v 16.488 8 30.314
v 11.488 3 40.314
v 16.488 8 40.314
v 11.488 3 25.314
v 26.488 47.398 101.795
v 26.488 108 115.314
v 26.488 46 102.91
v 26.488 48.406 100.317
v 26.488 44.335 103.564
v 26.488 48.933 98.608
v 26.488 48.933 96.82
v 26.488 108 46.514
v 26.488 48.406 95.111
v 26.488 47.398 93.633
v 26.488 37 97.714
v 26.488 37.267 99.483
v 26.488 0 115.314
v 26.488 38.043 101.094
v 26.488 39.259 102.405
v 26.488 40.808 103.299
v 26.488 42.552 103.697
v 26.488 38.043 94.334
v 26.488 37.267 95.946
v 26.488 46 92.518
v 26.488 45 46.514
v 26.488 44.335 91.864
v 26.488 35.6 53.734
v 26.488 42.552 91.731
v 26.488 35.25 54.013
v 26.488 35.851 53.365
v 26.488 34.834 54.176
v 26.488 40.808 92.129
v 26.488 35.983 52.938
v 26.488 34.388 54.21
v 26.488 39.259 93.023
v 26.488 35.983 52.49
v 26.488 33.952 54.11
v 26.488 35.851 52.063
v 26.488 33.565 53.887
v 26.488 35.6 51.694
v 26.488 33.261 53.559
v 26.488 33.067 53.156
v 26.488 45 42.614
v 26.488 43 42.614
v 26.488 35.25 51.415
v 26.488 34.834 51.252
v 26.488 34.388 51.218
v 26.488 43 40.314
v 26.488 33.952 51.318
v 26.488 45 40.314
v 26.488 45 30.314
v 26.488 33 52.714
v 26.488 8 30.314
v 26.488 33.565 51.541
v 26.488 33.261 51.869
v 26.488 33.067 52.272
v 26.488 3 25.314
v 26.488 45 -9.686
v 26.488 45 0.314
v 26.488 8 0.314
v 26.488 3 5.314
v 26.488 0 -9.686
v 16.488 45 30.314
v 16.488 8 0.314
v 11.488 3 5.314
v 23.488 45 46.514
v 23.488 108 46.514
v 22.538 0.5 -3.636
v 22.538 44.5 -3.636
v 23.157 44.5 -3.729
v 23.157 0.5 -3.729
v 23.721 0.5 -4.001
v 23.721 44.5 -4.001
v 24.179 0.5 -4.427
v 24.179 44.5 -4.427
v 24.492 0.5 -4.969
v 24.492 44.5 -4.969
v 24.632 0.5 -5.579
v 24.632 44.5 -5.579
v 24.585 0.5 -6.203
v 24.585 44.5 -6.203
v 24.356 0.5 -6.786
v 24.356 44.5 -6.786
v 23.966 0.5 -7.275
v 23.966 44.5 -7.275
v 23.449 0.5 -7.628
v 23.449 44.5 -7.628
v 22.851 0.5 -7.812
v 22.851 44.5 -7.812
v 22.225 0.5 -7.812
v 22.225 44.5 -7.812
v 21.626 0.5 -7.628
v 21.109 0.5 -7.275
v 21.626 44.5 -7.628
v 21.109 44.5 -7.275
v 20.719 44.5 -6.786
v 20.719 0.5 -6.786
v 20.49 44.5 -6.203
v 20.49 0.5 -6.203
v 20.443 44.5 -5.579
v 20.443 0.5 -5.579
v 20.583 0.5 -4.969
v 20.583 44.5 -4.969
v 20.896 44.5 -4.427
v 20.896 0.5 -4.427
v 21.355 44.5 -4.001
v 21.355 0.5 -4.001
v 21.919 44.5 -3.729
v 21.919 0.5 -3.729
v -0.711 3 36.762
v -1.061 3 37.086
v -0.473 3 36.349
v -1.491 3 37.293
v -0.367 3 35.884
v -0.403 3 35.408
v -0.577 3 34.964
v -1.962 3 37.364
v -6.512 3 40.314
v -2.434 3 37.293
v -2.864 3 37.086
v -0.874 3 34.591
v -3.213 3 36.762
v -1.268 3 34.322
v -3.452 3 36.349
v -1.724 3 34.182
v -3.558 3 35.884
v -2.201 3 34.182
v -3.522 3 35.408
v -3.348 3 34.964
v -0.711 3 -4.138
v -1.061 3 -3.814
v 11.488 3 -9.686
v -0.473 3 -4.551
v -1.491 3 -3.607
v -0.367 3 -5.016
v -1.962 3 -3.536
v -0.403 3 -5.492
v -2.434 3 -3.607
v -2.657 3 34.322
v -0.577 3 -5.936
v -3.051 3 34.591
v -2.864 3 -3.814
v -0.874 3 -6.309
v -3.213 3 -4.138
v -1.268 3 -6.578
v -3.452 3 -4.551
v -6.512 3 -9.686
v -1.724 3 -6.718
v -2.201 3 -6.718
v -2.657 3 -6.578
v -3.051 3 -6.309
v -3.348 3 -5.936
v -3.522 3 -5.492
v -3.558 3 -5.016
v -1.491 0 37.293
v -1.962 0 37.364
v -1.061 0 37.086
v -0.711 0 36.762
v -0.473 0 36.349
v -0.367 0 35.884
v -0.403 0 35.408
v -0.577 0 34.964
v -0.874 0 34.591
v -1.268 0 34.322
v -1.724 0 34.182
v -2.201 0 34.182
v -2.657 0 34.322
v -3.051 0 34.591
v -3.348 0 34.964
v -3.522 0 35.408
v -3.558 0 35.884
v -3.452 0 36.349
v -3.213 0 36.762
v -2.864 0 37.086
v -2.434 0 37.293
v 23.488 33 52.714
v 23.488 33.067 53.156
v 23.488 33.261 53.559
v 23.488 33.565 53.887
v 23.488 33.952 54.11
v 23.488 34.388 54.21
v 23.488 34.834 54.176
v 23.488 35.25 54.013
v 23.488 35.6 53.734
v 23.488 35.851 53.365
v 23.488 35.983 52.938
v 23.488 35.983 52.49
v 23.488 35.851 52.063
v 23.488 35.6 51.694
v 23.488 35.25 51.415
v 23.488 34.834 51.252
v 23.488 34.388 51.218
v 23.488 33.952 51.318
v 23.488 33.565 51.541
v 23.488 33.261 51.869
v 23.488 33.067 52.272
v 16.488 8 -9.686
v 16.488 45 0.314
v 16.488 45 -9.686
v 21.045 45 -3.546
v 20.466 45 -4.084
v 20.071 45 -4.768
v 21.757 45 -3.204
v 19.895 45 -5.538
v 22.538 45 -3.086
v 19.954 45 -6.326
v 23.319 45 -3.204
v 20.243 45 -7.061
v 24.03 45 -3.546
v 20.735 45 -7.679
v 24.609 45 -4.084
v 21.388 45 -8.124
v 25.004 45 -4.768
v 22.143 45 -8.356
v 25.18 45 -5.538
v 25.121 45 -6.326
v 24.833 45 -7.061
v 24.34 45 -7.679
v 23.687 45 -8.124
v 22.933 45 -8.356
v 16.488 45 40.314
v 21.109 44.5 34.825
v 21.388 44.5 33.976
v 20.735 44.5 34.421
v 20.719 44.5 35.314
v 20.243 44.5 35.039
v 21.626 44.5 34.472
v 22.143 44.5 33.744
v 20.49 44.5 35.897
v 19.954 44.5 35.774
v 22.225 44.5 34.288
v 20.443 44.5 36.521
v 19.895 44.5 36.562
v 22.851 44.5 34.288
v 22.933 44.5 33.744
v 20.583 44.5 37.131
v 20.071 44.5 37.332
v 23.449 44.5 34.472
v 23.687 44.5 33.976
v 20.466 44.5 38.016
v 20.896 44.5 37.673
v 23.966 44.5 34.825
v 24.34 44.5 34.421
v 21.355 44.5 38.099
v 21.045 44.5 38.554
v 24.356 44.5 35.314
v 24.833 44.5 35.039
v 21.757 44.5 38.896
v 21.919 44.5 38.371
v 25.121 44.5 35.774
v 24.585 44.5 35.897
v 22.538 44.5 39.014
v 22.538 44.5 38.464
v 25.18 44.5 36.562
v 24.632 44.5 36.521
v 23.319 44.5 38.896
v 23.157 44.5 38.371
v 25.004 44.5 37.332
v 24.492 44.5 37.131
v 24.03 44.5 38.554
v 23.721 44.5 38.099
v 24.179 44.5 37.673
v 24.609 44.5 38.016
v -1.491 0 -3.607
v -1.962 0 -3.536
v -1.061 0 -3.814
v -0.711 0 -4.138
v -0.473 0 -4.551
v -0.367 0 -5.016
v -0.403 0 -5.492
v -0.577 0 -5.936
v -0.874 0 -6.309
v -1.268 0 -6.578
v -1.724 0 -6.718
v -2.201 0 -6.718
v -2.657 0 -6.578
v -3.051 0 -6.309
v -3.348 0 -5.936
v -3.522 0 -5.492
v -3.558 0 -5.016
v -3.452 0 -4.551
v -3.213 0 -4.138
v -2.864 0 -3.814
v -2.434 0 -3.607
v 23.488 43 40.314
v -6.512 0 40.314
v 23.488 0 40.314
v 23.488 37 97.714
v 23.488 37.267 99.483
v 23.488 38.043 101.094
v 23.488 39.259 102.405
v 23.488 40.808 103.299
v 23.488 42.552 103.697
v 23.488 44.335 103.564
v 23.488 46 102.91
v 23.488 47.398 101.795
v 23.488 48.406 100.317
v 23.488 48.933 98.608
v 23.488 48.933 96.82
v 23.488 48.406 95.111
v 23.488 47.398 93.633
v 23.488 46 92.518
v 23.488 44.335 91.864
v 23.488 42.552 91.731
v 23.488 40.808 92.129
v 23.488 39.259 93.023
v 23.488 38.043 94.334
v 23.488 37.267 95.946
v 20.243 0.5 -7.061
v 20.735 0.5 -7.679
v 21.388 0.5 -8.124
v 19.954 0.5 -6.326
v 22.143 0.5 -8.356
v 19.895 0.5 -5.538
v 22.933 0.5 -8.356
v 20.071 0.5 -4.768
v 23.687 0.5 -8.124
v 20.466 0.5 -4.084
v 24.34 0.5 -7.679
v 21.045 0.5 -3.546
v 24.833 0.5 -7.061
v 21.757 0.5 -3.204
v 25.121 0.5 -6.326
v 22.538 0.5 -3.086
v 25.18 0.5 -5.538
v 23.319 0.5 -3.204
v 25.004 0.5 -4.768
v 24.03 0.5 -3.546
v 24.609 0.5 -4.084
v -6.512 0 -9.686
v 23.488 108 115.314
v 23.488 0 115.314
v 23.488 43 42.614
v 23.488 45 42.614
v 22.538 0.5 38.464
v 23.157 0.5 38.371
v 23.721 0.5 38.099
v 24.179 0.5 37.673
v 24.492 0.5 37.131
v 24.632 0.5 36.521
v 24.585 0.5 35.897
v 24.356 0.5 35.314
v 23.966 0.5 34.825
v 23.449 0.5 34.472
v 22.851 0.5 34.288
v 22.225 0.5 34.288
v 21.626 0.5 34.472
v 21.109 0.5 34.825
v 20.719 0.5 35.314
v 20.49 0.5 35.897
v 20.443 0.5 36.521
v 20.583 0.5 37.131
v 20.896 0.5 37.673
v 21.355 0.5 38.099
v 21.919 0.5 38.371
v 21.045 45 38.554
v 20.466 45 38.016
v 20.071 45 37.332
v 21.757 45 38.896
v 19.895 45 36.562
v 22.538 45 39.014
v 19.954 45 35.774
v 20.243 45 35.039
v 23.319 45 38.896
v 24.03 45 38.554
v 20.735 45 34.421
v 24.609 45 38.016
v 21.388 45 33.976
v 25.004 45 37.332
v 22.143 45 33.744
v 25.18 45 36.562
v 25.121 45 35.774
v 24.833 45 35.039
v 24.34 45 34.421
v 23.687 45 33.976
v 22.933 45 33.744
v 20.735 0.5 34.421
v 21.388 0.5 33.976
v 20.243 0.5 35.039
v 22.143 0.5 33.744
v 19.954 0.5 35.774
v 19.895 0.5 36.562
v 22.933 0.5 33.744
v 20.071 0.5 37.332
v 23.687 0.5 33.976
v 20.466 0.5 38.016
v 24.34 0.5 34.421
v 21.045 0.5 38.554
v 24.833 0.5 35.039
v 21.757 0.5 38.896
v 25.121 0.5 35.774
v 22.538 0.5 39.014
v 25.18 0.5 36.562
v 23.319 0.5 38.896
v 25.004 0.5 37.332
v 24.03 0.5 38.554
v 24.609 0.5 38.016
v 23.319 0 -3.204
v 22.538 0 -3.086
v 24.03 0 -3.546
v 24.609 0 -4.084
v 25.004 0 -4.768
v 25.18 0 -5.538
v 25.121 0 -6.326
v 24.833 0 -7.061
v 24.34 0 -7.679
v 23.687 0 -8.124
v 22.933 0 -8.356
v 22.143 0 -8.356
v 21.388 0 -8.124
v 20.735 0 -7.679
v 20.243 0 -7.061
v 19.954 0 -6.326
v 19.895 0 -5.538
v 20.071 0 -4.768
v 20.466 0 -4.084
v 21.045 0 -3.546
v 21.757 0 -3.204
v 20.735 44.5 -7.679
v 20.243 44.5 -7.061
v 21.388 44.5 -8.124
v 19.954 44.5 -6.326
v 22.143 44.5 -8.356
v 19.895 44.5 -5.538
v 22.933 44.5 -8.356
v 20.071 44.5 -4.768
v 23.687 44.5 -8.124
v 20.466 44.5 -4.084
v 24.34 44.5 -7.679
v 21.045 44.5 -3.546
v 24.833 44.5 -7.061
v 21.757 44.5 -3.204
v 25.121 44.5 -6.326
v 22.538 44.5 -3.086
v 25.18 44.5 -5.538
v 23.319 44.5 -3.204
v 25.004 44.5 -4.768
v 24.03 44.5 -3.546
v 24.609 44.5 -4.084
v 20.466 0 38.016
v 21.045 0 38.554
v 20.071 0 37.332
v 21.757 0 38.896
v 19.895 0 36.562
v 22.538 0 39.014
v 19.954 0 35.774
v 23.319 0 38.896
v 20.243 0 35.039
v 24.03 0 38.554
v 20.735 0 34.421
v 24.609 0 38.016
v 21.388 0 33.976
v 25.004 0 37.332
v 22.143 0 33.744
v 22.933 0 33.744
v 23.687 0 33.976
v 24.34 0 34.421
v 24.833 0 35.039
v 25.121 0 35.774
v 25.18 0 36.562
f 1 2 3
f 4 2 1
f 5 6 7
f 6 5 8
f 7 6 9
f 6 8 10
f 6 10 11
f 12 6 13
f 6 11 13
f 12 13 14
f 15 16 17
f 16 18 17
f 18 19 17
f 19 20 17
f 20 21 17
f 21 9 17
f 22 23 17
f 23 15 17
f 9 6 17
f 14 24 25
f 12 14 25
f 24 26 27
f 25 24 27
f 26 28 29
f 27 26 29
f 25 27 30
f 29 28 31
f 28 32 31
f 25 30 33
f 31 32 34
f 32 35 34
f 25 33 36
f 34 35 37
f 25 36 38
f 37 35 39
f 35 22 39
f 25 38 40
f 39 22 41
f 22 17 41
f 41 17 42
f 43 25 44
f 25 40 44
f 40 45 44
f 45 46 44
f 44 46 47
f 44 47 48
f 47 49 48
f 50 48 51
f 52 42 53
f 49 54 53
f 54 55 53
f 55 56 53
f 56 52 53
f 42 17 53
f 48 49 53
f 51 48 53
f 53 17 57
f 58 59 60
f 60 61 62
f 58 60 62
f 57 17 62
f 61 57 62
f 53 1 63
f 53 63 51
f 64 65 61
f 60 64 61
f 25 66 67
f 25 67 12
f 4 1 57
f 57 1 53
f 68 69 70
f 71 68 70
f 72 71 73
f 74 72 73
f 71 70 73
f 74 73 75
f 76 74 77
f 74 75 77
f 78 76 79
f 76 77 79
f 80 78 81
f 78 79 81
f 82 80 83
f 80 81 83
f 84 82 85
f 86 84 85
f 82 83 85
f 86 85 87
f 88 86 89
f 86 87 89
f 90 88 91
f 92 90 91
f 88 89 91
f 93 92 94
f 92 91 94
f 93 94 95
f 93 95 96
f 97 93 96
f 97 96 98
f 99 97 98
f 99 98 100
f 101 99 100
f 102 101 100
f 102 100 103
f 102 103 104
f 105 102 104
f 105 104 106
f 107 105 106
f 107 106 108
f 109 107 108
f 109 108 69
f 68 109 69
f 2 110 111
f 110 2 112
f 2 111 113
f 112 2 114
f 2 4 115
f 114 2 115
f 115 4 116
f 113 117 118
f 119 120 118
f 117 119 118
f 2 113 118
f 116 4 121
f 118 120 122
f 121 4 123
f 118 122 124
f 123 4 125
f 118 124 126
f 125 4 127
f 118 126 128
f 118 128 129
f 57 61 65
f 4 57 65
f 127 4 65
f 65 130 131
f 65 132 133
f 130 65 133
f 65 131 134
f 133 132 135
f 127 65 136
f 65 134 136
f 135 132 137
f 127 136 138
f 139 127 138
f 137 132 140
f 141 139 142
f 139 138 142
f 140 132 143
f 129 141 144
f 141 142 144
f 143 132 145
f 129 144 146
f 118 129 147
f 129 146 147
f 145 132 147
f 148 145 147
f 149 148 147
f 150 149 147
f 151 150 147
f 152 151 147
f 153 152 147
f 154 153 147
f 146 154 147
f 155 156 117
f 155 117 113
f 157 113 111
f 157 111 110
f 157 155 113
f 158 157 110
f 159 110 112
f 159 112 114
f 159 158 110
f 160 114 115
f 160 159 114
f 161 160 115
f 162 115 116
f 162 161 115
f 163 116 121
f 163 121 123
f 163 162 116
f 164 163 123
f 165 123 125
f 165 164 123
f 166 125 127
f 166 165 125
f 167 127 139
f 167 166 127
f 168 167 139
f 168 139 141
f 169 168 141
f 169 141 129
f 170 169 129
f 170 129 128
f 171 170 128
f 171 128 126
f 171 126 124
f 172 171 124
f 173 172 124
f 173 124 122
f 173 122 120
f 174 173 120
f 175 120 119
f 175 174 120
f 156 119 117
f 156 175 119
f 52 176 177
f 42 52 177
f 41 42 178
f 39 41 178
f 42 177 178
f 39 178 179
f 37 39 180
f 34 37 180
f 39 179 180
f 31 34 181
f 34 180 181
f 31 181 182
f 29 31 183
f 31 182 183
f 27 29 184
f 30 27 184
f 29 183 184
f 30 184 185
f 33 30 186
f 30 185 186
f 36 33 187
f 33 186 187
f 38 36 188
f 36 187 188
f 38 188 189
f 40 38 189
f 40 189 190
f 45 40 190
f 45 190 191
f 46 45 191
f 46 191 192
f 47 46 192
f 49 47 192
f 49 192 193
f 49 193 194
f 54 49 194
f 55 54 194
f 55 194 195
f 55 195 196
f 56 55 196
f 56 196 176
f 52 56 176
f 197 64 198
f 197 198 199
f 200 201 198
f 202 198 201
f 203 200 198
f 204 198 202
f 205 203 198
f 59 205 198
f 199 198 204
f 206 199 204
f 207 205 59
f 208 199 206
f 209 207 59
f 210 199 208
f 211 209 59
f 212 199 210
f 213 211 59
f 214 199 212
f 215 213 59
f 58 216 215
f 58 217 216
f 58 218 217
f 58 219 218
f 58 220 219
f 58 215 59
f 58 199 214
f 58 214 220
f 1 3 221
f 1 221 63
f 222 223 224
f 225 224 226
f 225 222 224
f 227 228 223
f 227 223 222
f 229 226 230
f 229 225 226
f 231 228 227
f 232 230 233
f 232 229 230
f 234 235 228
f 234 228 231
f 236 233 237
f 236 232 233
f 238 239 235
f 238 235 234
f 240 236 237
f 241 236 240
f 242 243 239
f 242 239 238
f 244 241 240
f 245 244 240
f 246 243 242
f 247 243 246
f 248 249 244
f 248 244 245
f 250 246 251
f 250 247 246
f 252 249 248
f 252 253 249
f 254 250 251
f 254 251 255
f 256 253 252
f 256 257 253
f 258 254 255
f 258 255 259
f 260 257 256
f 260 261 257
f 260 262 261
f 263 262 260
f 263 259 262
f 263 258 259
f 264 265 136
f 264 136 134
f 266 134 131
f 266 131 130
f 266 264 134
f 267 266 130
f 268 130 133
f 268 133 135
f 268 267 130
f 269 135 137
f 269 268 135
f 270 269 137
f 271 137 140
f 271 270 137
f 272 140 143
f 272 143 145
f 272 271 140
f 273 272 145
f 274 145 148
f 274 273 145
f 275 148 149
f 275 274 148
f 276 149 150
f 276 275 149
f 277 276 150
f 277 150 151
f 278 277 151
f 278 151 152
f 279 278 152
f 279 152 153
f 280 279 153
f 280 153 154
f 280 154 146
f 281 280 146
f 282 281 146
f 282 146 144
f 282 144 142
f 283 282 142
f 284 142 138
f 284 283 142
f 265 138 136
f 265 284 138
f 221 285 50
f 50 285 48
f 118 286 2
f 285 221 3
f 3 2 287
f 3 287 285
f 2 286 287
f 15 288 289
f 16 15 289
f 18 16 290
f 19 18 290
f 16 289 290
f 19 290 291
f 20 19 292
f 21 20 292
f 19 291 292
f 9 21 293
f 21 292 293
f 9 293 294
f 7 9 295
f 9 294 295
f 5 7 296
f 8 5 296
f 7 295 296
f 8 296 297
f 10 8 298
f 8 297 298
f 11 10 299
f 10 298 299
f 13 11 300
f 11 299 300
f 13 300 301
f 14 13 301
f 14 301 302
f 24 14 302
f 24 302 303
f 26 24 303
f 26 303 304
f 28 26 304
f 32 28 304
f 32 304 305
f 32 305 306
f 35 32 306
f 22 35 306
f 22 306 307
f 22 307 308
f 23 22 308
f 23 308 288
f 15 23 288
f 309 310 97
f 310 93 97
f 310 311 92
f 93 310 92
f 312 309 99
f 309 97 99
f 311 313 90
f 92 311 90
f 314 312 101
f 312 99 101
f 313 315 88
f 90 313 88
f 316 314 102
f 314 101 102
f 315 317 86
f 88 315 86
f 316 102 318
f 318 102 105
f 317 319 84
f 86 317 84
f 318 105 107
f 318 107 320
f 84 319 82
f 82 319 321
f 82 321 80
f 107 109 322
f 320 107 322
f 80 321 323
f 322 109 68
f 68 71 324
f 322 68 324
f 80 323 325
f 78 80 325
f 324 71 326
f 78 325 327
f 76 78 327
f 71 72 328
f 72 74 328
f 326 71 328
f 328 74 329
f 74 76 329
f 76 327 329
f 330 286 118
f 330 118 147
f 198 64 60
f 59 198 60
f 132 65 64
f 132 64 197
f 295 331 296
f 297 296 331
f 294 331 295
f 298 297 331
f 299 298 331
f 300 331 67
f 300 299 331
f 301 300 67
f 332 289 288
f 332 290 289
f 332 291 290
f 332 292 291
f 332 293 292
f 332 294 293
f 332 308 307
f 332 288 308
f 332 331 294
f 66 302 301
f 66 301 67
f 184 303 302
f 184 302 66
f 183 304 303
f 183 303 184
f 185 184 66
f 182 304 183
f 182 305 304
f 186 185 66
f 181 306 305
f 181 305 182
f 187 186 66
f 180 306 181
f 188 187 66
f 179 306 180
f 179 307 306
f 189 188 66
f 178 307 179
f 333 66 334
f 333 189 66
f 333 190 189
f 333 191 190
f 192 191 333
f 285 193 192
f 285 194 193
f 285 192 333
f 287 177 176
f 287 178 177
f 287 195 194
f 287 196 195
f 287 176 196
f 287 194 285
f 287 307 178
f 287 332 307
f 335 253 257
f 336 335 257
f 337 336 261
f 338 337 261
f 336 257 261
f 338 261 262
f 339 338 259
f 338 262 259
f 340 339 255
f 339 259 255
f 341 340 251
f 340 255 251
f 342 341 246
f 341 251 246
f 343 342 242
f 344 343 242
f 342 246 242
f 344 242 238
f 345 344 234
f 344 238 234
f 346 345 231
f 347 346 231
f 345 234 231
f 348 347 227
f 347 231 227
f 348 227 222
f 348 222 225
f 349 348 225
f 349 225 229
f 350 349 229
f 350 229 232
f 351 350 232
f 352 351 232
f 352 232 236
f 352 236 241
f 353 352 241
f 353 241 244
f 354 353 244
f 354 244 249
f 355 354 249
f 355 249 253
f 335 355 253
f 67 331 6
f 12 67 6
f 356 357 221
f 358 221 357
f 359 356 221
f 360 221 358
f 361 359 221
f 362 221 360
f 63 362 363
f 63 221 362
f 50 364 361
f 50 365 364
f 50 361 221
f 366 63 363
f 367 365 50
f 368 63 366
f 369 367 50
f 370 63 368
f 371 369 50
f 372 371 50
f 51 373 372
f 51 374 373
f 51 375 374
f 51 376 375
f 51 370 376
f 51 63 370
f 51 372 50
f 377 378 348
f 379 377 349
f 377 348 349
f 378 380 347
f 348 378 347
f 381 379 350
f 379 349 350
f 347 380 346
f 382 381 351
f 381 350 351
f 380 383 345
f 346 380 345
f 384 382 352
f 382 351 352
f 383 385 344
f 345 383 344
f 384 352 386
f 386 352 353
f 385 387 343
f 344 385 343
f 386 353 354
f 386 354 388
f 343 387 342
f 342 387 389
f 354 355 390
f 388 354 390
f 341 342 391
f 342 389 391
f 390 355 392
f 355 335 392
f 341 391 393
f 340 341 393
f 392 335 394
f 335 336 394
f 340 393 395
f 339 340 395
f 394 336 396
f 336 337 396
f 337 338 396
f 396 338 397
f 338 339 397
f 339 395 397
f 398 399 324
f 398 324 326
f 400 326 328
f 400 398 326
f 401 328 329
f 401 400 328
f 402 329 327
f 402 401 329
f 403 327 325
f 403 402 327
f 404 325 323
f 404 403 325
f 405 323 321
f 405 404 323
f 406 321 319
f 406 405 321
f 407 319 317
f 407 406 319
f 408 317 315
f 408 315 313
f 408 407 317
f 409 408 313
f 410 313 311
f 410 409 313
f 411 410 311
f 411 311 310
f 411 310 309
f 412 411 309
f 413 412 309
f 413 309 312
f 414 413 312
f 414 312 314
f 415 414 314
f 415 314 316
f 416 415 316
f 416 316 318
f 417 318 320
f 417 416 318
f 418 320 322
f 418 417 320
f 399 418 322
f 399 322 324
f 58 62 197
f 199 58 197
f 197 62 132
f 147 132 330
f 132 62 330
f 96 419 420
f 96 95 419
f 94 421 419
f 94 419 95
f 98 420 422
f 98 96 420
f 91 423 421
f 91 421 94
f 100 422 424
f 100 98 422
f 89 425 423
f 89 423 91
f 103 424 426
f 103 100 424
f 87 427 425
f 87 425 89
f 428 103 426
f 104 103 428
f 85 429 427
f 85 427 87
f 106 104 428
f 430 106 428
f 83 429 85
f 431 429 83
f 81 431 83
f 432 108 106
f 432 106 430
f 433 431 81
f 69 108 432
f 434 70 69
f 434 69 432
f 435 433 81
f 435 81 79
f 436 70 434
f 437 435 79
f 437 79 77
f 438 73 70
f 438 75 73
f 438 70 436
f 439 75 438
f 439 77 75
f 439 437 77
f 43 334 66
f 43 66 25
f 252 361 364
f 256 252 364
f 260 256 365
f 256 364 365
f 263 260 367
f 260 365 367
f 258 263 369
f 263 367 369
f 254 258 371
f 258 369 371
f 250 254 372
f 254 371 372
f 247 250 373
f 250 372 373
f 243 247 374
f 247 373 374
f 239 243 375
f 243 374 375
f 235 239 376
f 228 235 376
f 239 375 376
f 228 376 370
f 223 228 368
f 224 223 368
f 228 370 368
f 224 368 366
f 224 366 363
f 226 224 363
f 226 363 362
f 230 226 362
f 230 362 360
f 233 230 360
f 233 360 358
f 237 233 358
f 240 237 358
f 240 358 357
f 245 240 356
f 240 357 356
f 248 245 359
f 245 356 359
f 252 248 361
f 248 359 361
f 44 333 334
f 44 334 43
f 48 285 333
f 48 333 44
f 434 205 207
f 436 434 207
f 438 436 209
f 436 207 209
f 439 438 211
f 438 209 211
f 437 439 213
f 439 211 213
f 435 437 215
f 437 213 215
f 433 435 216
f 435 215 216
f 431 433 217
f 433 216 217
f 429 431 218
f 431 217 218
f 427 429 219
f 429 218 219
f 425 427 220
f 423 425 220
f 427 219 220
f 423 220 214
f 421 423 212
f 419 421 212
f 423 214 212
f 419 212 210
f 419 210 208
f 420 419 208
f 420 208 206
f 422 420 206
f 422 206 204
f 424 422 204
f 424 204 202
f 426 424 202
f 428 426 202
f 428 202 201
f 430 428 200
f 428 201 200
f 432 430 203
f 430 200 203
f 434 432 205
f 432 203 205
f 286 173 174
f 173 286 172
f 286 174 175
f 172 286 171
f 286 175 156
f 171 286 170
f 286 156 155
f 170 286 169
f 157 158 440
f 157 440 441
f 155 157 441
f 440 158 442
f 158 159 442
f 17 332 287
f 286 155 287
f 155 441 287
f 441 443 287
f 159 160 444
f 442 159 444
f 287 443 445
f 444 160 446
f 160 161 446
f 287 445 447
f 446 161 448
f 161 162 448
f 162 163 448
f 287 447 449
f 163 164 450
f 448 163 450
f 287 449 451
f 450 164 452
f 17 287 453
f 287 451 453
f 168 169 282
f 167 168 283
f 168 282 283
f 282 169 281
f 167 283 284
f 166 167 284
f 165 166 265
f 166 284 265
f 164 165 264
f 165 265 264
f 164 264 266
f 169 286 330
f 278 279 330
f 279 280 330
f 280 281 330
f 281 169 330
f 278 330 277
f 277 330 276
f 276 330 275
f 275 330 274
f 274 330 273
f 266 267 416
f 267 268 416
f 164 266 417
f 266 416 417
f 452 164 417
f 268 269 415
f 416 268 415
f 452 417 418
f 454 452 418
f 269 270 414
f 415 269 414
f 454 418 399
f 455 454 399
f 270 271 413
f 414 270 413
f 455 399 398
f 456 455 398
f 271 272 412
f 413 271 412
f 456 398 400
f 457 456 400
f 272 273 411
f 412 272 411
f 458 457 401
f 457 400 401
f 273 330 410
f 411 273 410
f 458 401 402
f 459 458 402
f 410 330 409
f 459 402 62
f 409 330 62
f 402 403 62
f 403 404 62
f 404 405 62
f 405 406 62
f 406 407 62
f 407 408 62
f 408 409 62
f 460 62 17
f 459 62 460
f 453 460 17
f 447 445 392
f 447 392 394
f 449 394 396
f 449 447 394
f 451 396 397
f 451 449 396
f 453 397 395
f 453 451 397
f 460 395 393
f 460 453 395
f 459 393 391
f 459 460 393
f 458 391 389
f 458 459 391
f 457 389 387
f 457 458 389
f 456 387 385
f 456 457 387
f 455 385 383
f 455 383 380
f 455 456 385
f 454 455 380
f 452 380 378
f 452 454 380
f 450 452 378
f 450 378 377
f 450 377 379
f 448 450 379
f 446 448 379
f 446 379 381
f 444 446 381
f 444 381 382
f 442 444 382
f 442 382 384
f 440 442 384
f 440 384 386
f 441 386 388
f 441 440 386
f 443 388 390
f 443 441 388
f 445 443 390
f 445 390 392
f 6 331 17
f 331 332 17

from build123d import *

# Parameters (mm, degrees)
SKETCH1_R           = 1.6
BOSS_EXTRUDE1_DEPTH = 3
SKETCH2_W           = 10
SKETCH2_H           = 10
BOSS_EXTRUDE2_DEPTH = 42
CHAMFER1_SIZE       = 5
SKETCH3_R           = 2.1
CUT_EXTRUDE1_DEPTH  = 52
SKETCH4_R           = 2.65
CUT_EXTRUDE2_DEPTH  = 0.5
SKETCH5_W           = 3
SKETCH5_H           = 43
BOSS_EXTRUDE3_DEPTH = 75
SKETCH6_W           = 3
SKETCH6_H           = 3.9
BOSS_EXTRUDE4_DEPTH = 2
SKETCH7_W           = 3
SKETCH7_H           = 68.8
BOSS_EXTRUDE5_DEPTH = 5
SKETCH8_R           = 1.5
CUT_EXTRUDE3_DEPTH  = 5
SKETCH9_W           = 3
SKETCH9_H           = 68.8
BOSS_EXTRUDE6_DEPTH = 15
SKETCH10_R          = 6
CUT_EXTRUDE4_DEPTH  = 10
SKETCH11_W          = 3
SKETCH11_H          = 68.8
BOSS_EXTRUDE7_DEPTH = 45


with BuildPart() as part:
    # Sketch1 → Boss-Extrude1 (new body)
    with BuildSketch(Plane(origin=(0, 0, 0), x_dir=(1, 0, 0), z_dir=(0, 1, 0))):
        Polygon((-6.512396694, 9.685950413), (1.487603306, 9.685950413), (26.487603306, 9.685950413), (26.487603306, -40.314049587), (1.487603306, -40.314049587), (-6.512396694, -40.314049587), align=None)
        with Locations(Location((-1.962396694, -35.764049587, 0), (0, 0, 270))):
            Circle(SKETCH1_R, mode=Mode.SUBTRACT)
        with Locations(Location((-1.962396694, 5.135950413, 0), (0, 0, 270))):
            Circle(SKETCH1_R, mode=Mode.SUBTRACT)
    extrude(amount=BOSS_EXTRUDE1_DEPTH)

    # Sketch2 → Boss-Extrude2 (add)
    with BuildSketch(Plane(origin=(0, 3, 0), x_dir=(1, 0, 0), z_dir=(0, 1, 0))):
        with Locations((21.487603306, -35.314049587)):
            Rectangle(SKETCH2_W, SKETCH2_H)
        with Locations((21.487603306, 4.685950413)):
            Rectangle(SKETCH2_W, SKETCH2_H)
    extrude(amount=BOSS_EXTRUDE2_DEPTH)

    # Chamfer1
    chamfer1_edges = [part.edges().sort_by_distance(p)[0] for p in [
        (21.487603306, 3, 30.314049587),
        (16.487603306, 3, 35.314049587),
        (16.487603306, 3, -4.685950413),
        (21.487603306, 3, 0.314049587),
    ]]
    chamfer(chamfer1_edges, length=CHAMFER1_SIZE)

    # Sketch3 → Cut-Extrude1 (cut)
    with BuildSketch(Plane(origin=(0, 45, 0), x_dir=(1, 0, 0), z_dir=(0, 1, 0))):
        with Locations(Location((22.537603306, -36.364049587, 0), (0, 0, 270))):
            Circle(SKETCH3_R)
        with Locations(Location((22.537603306, 5.735950413, 0), (0, 0, 270))):
            Circle(SKETCH3_R)
    extrude(amount=-CUT_EXTRUDE1_DEPTH, mode=Mode.SUBTRACT)

    # Sketch4 → Cut-Extrude2 (cut)
    with BuildSketch(Plane(origin=(0, 45, 0), x_dir=(1, 0, 0), z_dir=(0, 1, 0))):
        with Locations(Location((22.537603306, -36.364049587, 0), (0, 0, 270))):
            Circle(SKETCH4_R)
        with Locations(Location((22.537603306, 5.735950413, 0), (0, 0, 270))):
            Circle(SKETCH4_R)
    cut_extrude2 = extrude(amount=-CUT_EXTRUDE2_DEPTH, mode=Mode.SUBTRACT)

    # Mirror1: Cut-Extrude2 across plane
    add(cut_extrude2.mirror(Plane(origin=(0, 22.5, 0), x_dir=(0, 0, 1), z_dir=(0, -1, 0))), mode=Mode.SUBTRACT)

    # Sketch5 → Boss-Extrude3 (add)
    with BuildSketch(Plane.XY.offset(40.314049587)):
        with Locations((24.987603306, 21.5)):
            Rectangle(SKETCH5_W, SKETCH5_H)
    extrude(amount=BOSS_EXTRUDE3_DEPTH)

    # Sketch6 → Boss-Extrude4 (add)
    with BuildSketch(Plane(origin=(0, 43, 0), x_dir=(1, 0, 0), z_dir=(0, 1, 0))):
        with Locations((24.987603306, -44.564049587)):
            Rectangle(SKETCH6_W, SKETCH6_H)
    extrude(amount=BOSS_EXTRUDE4_DEPTH)

    # Sketch7 → Boss-Extrude5 (add)
    with BuildSketch(Plane(origin=(0, 43, 0), x_dir=(1, 0, 0), z_dir=(0, 1, 0))):
        with Locations((24.987603306, -80.914049587)):
            Rectangle(SKETCH7_W, SKETCH7_H)
    extrude(amount=BOSS_EXTRUDE5_DEPTH)

    # Sketch8 → Cut-Extrude3 (cut)
    with BuildSketch(Plane.ZY.offset(-23.487603306)):
        with Locations(Location((52.714049587, 34.5, 0), (0, 0, 270))):
            Circle(SKETCH8_R)
    extrude(amount=-CUT_EXTRUDE3_DEPTH, mode=Mode.SUBTRACT)

    # Sketch9 → Boss-Extrude6 (add)
    with BuildSketch(Plane(origin=(0, 48, 0), x_dir=(1, 0, 0), z_dir=(0, 1, 0))):
        with Locations((24.987603306, -80.914049587)):
            Rectangle(SKETCH9_W, SKETCH9_H)
    extrude(amount=BOSS_EXTRUDE6_DEPTH)

    # Sketch10 → Cut-Extrude4 (cut)
    with BuildSketch(Plane.ZY.offset(-23.487603306)):
        with Locations(Location((97.714049587, 43, 0), (0, 0, 270))):
            Circle(SKETCH10_R)
    extrude(amount=-CUT_EXTRUDE4_DEPTH, mode=Mode.SUBTRACT)

    # Sketch11 → Boss-Extrude7 (add)
    with BuildSketch(Plane(origin=(0, 63, 0), x_dir=(1, 0, 0), z_dir=(0, 1, 0))):
        with Locations((24.987603306, -80.914049587)):
            Rectangle(SKETCH11_W, SKETCH11_H)
    extrude(amount=BOSS_EXTRUDE7_DEPTH)


solid = part.part
